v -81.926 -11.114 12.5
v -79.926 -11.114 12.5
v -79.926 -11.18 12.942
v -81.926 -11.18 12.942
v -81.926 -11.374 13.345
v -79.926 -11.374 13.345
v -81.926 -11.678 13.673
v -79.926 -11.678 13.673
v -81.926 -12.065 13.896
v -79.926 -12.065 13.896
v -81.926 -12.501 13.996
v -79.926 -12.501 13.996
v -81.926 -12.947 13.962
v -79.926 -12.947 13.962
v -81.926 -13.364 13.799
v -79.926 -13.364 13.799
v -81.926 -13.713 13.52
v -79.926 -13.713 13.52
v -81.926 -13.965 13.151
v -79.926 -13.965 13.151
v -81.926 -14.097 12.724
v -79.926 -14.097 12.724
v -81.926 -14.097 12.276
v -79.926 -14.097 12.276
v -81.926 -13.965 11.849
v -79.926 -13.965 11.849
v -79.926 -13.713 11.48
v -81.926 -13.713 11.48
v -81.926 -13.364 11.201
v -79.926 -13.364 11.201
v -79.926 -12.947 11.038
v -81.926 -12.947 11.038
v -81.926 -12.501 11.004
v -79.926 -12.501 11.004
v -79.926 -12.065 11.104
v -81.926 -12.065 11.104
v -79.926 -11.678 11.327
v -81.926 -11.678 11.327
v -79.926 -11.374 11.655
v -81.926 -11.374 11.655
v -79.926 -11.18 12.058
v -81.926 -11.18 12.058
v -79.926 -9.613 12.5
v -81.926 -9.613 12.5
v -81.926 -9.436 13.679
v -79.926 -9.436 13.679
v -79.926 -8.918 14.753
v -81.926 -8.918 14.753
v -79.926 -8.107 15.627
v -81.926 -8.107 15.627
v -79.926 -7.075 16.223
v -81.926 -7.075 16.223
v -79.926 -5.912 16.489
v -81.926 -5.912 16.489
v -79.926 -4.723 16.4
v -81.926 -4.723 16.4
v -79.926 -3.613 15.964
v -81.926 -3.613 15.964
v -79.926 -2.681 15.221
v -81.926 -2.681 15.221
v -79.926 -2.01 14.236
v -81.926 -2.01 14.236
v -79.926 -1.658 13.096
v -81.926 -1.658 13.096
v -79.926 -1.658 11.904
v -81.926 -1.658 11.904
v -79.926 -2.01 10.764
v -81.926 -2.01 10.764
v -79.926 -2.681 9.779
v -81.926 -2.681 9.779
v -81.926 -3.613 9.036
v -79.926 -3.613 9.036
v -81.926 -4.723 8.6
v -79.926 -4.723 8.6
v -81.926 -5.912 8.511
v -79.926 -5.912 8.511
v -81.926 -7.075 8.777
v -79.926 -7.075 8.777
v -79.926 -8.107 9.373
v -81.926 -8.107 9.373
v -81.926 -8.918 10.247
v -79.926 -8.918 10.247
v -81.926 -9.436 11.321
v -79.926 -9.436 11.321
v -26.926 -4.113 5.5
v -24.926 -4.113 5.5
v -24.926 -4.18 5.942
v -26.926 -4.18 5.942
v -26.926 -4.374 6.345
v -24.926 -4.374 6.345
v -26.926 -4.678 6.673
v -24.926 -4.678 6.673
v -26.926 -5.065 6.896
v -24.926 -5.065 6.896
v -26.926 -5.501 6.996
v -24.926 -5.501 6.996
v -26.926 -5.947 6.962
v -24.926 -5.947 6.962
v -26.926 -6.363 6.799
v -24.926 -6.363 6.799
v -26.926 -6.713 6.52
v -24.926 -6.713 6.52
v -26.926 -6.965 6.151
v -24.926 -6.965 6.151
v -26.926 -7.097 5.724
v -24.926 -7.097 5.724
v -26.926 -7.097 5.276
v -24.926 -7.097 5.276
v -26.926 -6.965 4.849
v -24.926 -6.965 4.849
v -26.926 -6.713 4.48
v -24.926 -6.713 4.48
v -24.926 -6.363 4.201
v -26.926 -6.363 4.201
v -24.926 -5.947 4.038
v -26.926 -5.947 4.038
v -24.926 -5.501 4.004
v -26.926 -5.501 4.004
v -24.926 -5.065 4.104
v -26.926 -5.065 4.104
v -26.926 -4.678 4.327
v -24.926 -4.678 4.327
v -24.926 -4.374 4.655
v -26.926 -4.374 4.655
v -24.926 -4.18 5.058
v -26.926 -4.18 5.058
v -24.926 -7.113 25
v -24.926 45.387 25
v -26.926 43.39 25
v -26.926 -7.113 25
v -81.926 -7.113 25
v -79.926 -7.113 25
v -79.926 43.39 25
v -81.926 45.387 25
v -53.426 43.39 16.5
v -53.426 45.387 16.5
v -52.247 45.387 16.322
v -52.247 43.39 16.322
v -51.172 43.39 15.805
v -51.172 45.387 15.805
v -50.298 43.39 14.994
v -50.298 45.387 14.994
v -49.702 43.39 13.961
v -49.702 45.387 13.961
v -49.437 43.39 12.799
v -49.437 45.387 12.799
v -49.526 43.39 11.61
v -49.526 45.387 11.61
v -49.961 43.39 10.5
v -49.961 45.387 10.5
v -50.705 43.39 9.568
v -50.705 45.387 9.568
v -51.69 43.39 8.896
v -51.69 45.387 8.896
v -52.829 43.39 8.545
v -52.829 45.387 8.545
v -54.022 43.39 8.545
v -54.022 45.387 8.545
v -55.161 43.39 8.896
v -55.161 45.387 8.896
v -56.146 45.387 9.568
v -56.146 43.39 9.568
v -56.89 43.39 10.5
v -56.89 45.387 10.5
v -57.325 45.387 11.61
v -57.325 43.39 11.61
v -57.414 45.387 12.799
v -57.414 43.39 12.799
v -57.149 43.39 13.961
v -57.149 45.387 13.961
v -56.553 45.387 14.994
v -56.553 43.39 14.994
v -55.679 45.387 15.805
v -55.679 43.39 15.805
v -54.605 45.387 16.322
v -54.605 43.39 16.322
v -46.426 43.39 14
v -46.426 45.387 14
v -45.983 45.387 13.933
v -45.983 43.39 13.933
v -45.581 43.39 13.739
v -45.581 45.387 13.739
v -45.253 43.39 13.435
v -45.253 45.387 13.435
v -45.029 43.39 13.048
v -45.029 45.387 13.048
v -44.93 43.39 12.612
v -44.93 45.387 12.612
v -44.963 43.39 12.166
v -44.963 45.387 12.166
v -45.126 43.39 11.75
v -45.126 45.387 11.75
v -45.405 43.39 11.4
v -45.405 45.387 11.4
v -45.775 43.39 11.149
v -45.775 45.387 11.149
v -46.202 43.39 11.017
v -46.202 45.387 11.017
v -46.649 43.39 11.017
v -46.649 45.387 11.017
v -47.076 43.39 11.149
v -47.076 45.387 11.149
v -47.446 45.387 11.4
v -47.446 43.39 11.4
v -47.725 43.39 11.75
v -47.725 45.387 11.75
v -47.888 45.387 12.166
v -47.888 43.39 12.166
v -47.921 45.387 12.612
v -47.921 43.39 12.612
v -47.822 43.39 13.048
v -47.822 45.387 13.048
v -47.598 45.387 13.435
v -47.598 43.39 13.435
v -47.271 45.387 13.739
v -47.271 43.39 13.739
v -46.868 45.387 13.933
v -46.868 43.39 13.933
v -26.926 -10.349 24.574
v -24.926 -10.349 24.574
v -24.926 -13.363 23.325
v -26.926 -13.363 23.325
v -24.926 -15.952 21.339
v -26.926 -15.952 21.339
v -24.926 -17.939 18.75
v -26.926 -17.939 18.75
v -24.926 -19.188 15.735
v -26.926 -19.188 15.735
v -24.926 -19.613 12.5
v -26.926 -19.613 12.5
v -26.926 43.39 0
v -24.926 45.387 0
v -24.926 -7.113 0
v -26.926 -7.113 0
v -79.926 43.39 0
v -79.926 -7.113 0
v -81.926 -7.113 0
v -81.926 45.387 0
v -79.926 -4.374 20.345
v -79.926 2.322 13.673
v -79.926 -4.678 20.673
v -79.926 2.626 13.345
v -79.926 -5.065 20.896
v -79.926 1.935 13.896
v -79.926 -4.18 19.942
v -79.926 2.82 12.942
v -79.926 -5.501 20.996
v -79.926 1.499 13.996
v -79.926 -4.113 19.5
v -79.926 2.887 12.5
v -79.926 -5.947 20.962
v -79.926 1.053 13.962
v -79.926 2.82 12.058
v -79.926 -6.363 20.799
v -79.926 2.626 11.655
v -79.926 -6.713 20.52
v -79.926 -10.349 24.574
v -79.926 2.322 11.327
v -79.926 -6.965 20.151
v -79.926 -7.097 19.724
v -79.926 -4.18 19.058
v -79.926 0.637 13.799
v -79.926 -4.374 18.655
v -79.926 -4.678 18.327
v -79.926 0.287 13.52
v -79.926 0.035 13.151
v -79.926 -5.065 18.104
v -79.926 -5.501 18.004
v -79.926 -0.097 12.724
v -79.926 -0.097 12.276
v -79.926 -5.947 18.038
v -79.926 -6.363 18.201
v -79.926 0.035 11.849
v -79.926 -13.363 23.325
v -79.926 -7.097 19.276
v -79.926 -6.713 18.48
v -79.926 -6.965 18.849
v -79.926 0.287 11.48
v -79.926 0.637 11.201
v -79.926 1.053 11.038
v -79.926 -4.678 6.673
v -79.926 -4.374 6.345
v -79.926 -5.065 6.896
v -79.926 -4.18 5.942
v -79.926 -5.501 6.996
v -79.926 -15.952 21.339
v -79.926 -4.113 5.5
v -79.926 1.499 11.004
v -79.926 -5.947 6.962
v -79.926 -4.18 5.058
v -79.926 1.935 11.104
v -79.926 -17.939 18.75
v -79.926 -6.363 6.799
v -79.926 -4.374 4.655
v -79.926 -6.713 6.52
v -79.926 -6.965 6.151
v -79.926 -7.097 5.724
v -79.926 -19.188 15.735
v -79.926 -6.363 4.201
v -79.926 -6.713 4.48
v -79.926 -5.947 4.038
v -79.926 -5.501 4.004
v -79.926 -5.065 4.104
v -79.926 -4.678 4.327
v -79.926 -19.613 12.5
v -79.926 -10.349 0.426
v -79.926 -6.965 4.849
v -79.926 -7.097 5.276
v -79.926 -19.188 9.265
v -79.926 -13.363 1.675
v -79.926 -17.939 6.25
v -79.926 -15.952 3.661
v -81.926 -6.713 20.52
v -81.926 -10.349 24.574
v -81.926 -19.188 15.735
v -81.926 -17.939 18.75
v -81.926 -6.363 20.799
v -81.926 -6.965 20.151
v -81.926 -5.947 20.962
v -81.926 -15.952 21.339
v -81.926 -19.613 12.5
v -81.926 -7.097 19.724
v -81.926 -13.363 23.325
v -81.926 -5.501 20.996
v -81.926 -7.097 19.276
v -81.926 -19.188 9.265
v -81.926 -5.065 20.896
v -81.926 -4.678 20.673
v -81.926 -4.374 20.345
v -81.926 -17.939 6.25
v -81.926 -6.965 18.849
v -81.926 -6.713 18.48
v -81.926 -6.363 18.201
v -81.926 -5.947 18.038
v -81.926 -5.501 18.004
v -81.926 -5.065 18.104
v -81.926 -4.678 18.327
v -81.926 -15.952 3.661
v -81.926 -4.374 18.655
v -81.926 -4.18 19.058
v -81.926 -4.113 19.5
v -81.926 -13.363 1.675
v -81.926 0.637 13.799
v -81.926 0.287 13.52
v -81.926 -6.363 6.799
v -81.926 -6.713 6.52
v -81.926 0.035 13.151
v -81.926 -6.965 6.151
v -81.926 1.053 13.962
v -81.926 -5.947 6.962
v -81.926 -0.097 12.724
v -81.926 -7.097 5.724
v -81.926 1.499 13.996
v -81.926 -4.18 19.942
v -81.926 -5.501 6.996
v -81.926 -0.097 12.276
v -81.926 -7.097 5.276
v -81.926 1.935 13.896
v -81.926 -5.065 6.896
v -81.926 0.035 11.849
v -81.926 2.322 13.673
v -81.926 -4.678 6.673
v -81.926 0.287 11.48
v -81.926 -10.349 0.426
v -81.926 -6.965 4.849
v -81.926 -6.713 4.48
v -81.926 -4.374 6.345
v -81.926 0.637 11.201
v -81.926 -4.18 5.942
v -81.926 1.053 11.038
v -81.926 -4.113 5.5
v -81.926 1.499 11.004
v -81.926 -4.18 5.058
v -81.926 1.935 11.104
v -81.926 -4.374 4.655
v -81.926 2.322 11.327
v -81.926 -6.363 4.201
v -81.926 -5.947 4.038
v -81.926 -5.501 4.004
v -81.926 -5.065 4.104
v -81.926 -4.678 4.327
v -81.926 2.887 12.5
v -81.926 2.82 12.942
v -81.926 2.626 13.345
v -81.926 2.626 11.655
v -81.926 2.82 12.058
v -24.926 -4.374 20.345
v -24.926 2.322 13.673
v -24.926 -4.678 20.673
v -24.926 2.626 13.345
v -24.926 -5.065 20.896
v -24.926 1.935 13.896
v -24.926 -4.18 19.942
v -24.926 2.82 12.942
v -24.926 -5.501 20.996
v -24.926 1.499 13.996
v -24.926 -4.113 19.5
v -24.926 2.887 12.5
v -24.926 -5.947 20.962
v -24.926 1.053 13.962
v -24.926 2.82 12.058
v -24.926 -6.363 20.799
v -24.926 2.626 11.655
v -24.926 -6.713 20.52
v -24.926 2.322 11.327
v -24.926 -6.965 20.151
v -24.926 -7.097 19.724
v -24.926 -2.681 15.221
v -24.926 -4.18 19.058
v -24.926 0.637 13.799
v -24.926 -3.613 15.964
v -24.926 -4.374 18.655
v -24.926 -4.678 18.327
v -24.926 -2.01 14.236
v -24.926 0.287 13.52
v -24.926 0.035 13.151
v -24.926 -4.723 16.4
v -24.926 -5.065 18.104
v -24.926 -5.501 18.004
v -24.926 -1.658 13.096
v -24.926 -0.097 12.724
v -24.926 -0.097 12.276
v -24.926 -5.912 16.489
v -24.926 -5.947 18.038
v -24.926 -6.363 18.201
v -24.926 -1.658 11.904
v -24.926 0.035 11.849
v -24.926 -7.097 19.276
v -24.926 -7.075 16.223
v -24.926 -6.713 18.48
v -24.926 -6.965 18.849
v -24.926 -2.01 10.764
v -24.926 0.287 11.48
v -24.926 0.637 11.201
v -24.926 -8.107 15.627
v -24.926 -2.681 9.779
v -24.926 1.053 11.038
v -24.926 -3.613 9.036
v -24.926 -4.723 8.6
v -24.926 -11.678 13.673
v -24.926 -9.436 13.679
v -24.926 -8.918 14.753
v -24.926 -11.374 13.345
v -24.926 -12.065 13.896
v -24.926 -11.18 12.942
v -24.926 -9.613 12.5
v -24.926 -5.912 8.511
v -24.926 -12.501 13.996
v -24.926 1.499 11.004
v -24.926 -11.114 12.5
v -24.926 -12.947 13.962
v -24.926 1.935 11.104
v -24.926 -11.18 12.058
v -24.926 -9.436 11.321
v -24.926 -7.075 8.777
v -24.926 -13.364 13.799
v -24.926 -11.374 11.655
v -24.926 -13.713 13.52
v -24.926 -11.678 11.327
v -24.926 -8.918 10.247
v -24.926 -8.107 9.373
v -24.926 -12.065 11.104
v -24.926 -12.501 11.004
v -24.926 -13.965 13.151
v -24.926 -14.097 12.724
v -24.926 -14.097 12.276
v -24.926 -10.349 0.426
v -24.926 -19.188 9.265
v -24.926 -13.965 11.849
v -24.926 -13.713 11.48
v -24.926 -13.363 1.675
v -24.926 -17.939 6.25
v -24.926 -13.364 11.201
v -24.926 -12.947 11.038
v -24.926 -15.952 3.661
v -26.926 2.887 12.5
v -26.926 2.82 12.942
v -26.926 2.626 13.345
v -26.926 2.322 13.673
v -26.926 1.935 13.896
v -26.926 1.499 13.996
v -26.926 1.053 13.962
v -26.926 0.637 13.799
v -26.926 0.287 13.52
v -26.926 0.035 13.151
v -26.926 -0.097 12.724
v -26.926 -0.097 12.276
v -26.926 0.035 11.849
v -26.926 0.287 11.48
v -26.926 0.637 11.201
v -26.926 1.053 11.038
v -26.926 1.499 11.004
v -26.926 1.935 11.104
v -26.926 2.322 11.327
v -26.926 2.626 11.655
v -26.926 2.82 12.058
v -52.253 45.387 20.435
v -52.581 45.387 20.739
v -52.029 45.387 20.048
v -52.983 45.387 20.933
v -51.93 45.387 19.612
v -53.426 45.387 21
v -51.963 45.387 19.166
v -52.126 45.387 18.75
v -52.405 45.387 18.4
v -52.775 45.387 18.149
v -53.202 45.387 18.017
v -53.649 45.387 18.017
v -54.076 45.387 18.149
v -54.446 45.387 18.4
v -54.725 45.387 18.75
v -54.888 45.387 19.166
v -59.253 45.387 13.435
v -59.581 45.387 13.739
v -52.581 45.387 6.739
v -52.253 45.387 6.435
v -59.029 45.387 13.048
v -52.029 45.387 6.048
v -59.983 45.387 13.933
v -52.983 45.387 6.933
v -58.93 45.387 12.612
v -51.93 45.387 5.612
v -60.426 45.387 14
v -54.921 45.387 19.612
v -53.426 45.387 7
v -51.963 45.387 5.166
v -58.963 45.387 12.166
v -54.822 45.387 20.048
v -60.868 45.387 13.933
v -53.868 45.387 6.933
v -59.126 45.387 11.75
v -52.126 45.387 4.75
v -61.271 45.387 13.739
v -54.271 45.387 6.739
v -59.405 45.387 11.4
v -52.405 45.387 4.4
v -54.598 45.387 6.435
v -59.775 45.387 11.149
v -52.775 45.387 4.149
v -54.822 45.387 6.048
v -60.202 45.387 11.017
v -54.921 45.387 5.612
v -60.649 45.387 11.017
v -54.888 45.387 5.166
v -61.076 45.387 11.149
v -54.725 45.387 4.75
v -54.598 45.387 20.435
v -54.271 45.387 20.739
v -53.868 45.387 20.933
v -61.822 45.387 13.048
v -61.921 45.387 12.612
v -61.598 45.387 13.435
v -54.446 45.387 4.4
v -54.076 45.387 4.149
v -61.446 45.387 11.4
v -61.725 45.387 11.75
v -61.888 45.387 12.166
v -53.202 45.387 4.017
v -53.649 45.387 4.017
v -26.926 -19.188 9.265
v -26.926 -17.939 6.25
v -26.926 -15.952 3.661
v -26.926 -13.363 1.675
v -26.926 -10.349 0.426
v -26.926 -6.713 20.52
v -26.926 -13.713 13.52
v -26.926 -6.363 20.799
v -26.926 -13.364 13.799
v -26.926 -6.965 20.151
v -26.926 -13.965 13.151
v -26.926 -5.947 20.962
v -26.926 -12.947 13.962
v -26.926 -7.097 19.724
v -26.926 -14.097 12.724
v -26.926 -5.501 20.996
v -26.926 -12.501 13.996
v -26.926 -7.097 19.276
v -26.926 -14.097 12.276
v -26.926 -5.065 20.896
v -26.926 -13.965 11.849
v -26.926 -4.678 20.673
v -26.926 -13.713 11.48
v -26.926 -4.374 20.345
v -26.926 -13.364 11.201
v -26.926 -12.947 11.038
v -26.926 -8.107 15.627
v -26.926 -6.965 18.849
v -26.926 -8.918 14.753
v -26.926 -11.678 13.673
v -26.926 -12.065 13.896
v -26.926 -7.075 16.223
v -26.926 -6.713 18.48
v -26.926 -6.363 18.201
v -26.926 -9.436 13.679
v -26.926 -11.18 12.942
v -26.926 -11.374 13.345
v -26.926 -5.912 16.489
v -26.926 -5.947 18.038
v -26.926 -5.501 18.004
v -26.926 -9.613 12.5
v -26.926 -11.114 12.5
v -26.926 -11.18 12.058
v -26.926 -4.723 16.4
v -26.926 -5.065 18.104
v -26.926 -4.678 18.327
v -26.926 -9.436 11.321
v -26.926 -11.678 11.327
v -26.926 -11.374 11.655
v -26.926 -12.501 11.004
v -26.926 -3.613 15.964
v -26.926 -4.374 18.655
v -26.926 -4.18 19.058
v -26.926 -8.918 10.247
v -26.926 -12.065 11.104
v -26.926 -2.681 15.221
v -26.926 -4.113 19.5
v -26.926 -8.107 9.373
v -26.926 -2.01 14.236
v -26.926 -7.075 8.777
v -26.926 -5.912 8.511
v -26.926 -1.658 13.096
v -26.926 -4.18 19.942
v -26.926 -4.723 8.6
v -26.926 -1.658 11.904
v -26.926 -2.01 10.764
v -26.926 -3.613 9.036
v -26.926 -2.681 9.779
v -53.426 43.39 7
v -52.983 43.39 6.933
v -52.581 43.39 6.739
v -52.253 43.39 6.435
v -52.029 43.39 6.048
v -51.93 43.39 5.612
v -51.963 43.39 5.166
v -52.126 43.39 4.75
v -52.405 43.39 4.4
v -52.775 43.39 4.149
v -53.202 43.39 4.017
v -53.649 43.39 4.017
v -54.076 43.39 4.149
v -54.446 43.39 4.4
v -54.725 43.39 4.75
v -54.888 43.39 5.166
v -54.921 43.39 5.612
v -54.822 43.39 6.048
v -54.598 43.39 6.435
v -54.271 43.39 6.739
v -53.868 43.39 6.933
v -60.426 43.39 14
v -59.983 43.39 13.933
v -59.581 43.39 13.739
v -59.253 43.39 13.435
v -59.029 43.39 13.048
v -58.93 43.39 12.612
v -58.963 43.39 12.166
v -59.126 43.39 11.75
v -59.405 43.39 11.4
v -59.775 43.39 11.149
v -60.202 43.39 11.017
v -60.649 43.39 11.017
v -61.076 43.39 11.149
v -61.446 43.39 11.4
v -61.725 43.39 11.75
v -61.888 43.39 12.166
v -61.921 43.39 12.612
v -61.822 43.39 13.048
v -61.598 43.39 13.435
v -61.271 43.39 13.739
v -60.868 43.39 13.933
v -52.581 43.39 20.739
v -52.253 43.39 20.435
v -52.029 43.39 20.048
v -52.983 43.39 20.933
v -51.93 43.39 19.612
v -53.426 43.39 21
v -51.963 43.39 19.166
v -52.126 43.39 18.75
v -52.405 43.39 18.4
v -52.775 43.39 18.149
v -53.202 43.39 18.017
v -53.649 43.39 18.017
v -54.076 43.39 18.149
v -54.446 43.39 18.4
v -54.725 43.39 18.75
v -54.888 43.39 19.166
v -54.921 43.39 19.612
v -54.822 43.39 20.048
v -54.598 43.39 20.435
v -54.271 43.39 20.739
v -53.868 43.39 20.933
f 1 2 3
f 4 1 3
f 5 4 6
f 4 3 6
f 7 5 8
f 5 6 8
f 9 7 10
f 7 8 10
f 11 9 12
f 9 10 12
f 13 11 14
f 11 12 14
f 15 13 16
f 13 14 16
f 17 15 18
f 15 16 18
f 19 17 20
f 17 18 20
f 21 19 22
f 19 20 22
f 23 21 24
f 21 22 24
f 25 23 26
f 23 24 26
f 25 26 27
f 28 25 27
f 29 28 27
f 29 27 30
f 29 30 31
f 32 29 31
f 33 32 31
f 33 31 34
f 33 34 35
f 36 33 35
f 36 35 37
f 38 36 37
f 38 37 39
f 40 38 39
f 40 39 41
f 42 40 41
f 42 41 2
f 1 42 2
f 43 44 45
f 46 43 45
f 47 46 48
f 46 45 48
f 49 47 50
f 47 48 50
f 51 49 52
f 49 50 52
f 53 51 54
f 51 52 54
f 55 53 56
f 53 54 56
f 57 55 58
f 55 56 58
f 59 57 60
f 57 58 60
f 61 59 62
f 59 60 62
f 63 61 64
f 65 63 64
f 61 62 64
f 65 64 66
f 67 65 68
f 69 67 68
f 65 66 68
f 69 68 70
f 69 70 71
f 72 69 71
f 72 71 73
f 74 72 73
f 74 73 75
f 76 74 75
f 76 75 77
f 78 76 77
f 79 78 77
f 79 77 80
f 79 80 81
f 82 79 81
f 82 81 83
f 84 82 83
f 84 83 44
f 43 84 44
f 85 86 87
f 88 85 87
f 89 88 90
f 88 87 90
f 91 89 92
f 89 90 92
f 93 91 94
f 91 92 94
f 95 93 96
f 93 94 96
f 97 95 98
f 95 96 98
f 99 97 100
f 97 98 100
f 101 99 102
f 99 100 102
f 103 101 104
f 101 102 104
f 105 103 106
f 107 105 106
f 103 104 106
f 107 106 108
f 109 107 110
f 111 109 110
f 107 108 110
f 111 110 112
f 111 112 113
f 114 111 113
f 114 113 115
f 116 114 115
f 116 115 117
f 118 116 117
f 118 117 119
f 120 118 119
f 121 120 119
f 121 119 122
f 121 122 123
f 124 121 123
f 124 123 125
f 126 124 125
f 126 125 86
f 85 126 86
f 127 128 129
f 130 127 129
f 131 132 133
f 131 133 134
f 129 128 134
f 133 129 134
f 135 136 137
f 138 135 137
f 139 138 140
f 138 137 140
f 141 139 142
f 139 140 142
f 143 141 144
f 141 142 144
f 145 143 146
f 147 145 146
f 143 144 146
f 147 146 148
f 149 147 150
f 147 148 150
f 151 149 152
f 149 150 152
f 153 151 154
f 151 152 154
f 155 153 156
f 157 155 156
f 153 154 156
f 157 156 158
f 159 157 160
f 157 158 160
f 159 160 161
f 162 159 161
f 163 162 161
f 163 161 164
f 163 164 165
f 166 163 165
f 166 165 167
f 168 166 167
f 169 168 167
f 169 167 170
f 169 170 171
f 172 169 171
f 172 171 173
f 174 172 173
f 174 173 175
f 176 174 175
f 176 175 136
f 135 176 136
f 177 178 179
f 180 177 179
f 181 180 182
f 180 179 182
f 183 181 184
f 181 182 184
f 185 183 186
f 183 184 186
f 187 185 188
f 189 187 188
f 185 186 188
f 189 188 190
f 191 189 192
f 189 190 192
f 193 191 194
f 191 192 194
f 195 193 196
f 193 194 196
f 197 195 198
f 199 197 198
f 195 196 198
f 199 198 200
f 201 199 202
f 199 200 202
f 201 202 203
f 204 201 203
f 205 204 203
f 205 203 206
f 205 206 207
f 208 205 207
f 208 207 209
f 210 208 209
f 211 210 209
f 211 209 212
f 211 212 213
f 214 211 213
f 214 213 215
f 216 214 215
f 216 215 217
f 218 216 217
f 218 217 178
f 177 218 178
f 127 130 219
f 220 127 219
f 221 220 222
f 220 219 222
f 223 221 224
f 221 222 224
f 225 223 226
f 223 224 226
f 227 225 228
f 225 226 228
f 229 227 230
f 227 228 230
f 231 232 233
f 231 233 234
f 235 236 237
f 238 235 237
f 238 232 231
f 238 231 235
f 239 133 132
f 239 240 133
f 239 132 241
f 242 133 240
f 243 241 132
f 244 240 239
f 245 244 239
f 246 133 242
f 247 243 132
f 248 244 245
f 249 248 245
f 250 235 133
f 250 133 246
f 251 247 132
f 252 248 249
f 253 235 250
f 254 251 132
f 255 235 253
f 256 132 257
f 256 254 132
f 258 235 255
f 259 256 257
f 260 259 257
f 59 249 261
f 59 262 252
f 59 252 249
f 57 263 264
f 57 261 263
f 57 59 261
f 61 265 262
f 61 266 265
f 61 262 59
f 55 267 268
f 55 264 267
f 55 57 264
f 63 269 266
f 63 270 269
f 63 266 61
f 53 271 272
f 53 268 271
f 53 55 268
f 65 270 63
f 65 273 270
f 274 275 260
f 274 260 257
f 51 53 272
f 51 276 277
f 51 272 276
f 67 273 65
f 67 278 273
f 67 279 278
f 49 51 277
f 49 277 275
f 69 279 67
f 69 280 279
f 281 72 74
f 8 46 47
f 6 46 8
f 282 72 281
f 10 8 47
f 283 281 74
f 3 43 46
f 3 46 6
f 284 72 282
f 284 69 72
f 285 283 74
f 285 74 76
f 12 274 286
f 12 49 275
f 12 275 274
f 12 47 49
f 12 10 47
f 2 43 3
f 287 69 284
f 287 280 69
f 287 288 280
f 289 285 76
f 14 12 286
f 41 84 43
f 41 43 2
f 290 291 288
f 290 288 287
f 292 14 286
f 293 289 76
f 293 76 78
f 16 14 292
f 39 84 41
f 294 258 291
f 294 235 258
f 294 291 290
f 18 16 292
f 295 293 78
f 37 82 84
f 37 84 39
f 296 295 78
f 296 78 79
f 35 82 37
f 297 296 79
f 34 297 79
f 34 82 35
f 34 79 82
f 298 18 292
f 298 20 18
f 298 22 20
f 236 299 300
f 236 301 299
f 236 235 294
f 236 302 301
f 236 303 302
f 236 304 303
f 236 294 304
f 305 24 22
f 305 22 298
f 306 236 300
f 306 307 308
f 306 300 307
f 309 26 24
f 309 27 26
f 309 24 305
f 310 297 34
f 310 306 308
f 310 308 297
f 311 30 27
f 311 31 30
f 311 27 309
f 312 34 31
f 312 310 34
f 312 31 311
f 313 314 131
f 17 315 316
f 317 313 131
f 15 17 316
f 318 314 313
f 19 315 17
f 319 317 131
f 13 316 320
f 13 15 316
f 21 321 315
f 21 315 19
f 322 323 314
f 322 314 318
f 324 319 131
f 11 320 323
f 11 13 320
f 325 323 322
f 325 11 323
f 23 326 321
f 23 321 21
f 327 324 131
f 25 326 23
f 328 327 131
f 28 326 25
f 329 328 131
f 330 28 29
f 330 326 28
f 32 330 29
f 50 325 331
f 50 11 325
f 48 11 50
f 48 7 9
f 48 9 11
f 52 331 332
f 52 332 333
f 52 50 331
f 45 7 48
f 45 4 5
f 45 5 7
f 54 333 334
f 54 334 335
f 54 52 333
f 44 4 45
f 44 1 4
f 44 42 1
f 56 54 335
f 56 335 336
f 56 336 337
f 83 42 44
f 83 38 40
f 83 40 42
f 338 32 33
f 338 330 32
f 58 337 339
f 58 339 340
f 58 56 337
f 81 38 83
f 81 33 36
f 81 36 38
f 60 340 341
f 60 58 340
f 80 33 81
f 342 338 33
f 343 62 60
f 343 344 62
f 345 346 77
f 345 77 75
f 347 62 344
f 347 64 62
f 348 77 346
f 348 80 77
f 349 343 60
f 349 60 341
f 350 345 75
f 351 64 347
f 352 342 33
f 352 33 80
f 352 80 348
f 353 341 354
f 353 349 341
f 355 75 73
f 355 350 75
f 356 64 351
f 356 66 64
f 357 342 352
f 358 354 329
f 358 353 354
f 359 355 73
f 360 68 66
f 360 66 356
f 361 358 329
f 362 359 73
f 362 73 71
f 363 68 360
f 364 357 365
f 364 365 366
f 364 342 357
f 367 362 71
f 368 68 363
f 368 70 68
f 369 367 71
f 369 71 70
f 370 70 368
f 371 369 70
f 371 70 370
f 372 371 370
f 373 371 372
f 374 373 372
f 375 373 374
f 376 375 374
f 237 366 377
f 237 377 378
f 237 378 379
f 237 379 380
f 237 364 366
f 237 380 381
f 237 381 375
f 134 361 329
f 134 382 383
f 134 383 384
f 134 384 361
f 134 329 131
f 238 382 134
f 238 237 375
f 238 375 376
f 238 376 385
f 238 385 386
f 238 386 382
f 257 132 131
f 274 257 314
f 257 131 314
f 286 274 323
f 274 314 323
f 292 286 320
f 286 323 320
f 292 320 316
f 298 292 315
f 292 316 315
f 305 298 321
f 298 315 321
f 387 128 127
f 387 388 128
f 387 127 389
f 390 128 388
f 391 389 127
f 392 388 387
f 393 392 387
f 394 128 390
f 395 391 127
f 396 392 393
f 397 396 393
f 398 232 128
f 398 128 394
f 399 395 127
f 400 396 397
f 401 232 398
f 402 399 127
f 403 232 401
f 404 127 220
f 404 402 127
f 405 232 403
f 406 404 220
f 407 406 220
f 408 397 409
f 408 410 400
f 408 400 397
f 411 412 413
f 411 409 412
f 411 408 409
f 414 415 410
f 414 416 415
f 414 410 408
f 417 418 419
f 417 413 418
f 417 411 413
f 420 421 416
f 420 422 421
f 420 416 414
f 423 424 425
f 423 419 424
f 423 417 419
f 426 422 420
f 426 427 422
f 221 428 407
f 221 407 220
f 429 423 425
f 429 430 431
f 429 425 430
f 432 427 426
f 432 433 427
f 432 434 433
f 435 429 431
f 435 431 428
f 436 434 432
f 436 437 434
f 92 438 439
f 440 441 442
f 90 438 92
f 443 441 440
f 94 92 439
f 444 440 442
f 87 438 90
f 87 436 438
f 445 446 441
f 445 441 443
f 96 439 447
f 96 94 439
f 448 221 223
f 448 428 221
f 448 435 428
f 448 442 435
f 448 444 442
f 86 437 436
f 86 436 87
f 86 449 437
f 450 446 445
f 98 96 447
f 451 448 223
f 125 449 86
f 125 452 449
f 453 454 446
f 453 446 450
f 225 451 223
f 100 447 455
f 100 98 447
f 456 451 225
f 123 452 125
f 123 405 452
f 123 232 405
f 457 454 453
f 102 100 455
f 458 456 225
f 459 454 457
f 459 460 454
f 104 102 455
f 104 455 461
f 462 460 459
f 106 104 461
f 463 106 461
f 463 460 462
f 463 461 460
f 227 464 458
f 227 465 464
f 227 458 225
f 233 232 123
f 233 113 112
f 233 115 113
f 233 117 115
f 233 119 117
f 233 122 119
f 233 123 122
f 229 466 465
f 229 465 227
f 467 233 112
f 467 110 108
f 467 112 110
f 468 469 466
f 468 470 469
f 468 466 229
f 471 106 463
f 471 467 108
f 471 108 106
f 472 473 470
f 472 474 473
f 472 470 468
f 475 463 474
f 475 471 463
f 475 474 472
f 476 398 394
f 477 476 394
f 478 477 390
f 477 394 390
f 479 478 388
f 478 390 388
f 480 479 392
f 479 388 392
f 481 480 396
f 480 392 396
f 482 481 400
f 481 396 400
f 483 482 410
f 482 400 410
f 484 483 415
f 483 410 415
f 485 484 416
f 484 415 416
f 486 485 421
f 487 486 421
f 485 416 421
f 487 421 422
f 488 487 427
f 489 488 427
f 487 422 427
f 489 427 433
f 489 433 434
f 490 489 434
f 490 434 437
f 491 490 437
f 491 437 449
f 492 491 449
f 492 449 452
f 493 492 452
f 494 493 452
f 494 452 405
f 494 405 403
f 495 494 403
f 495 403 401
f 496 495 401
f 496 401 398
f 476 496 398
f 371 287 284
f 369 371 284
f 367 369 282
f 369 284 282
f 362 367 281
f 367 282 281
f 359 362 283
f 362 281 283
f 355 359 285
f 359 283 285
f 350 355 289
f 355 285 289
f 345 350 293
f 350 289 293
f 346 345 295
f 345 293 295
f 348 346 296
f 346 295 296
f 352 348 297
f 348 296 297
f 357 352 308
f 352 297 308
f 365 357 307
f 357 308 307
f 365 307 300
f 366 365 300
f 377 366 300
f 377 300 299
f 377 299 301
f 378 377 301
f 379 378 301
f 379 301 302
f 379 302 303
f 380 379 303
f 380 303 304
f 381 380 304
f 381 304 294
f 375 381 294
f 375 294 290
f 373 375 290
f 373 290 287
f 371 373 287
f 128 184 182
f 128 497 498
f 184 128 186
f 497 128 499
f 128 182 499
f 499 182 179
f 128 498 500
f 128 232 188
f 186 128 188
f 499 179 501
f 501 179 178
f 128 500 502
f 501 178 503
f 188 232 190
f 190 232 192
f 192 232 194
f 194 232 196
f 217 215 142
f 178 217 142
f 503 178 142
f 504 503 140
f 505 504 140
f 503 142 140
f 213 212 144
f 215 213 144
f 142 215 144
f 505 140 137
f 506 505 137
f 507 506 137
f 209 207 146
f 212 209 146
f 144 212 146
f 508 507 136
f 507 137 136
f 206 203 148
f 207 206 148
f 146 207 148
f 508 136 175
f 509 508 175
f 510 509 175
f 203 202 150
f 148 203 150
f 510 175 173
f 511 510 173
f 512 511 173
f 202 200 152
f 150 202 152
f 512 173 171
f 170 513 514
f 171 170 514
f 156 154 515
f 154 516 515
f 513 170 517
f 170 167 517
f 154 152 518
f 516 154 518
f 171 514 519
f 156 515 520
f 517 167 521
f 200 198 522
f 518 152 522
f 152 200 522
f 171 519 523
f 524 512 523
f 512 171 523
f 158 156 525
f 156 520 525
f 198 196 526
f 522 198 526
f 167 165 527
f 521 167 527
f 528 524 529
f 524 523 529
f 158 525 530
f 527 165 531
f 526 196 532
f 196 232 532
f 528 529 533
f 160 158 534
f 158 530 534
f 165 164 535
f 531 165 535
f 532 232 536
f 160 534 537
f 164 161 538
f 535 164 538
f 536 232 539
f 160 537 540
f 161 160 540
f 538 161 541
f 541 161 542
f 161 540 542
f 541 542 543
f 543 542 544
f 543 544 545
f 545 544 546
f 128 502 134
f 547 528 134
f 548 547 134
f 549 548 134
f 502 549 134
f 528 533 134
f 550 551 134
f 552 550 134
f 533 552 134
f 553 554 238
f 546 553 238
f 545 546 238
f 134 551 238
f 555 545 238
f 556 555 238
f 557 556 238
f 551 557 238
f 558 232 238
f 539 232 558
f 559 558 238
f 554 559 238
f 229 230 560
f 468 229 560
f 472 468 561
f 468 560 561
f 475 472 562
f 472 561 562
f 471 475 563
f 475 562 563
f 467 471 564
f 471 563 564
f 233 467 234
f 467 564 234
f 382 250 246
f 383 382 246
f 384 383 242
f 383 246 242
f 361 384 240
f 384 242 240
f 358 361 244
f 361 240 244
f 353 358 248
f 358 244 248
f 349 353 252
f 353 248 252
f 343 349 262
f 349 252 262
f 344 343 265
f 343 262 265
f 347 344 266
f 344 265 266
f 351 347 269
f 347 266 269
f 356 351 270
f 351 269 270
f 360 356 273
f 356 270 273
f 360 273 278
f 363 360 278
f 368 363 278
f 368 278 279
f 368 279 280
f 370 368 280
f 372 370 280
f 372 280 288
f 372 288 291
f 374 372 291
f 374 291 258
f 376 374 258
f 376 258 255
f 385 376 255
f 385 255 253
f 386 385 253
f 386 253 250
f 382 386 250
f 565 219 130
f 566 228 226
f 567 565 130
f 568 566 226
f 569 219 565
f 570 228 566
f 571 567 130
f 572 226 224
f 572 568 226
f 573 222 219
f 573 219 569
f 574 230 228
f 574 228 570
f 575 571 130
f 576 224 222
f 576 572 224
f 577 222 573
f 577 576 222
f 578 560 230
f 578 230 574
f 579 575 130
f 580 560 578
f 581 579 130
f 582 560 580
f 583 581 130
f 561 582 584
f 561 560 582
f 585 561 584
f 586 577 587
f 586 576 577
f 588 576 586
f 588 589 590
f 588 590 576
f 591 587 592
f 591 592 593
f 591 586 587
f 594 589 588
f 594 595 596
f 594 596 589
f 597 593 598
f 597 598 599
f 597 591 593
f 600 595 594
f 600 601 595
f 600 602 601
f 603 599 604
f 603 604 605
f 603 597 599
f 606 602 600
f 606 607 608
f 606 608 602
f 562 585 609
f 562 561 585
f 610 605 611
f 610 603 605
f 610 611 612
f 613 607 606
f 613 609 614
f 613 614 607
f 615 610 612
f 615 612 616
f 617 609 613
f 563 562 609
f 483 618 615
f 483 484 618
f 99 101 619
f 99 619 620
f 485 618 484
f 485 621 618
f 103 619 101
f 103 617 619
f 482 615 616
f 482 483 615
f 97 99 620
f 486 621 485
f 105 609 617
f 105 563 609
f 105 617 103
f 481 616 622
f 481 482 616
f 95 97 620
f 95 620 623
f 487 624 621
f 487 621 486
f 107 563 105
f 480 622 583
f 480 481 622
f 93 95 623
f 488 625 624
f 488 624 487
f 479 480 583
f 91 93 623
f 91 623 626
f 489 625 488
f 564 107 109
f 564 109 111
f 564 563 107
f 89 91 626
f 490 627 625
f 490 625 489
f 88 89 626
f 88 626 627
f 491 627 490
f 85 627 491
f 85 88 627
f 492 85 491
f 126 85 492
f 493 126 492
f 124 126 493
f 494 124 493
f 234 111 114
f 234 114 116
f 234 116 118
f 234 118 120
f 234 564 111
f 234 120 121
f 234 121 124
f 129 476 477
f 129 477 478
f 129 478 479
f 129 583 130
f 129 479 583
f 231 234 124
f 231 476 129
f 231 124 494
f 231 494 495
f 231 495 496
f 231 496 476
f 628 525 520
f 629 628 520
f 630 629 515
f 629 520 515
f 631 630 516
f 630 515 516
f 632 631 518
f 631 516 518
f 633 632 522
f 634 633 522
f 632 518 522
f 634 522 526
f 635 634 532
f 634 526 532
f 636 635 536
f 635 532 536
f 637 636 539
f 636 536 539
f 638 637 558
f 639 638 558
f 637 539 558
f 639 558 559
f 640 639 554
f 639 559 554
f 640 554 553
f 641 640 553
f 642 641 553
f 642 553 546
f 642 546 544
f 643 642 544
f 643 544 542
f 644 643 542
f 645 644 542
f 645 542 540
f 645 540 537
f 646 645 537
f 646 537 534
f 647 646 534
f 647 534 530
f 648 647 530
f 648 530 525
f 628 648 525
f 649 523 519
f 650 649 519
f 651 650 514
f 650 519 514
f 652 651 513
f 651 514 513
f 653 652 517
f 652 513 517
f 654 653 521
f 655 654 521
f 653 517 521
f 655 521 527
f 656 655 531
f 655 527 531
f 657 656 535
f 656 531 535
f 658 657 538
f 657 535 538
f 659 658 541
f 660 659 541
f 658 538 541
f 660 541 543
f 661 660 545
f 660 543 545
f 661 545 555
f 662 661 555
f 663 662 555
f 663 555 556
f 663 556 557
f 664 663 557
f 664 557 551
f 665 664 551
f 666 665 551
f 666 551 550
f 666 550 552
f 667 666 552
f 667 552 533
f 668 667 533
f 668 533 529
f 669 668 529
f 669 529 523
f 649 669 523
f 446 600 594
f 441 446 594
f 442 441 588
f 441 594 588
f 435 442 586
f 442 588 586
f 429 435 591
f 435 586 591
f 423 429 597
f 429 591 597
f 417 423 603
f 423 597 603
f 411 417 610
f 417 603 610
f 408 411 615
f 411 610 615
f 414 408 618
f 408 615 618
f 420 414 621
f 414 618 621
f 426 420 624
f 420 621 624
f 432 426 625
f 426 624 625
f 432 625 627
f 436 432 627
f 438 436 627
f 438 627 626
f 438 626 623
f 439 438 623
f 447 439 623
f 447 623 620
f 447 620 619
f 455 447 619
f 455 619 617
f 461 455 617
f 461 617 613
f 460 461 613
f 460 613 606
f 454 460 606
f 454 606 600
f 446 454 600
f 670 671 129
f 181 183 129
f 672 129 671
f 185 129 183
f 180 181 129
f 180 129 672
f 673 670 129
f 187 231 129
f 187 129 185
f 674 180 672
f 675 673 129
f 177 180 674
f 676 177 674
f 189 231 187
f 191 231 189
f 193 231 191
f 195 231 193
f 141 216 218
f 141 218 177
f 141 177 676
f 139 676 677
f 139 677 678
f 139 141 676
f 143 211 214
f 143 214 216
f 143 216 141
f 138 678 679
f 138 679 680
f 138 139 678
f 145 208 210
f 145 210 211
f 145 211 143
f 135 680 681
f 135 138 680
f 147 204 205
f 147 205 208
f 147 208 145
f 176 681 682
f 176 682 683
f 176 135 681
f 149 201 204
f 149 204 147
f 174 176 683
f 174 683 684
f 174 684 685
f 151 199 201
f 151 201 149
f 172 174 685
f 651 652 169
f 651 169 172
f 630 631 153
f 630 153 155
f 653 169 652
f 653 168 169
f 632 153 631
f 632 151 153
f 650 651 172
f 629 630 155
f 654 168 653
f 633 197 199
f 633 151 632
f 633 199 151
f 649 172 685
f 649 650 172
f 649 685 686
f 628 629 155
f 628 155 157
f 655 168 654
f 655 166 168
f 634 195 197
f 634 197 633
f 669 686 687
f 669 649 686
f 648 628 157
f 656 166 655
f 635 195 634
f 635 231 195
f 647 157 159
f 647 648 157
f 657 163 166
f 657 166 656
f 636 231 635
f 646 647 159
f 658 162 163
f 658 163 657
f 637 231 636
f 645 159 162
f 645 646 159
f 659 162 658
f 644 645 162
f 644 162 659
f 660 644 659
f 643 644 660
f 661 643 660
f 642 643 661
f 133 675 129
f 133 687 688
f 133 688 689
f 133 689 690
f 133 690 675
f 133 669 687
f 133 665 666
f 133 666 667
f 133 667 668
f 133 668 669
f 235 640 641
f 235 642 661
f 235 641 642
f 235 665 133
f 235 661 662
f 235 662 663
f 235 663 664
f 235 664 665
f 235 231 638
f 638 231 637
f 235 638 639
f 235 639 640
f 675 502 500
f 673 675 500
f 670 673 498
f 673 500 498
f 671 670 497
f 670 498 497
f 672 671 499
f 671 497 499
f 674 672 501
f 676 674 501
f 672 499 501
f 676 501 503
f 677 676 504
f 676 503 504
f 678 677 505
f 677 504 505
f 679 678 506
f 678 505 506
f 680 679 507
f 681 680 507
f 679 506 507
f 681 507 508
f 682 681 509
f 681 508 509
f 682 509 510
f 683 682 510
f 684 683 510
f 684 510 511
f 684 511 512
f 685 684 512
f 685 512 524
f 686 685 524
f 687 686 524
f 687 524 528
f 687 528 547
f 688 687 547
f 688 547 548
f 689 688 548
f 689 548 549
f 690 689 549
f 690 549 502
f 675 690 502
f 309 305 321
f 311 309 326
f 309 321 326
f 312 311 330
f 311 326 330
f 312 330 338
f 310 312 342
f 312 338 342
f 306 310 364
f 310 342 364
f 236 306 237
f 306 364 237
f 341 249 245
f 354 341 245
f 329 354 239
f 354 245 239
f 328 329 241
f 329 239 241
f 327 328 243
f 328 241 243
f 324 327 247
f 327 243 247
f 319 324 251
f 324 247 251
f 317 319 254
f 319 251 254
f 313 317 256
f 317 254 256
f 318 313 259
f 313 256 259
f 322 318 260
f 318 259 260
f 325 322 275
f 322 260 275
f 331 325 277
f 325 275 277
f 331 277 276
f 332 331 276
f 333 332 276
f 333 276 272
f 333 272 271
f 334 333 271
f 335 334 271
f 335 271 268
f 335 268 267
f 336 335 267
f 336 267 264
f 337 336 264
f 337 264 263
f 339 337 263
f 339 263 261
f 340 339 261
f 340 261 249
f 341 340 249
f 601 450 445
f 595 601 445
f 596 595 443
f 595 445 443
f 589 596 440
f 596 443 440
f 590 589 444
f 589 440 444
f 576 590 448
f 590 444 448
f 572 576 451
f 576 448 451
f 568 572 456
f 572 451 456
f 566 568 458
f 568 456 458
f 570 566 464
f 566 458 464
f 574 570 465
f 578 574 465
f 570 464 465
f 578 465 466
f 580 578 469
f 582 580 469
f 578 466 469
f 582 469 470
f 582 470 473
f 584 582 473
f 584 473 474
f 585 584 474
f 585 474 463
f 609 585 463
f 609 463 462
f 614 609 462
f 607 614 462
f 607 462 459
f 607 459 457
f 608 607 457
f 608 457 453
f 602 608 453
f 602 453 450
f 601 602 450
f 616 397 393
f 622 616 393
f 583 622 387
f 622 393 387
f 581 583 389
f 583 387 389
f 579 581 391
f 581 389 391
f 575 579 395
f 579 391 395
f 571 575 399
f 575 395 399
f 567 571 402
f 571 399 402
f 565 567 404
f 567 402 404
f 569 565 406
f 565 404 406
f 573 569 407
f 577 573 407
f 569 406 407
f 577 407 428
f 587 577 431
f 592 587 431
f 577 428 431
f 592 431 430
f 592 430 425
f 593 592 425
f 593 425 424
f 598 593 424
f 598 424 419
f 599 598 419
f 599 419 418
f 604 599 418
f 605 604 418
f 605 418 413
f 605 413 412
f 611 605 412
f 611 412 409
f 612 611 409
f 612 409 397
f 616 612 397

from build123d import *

# Parameters (mm, degrees)
BOSS_EXTRUDE2_DEPTH = 25
SKETCH4_R           = 4
CUT_EXTRUDE1_DEPTH  = 108.5257706
SKETCH6_R           = 4
CUT_EXTRUDE2_DEPTH  = 78.032036302
CUT_EXTRUDE3_DEPTH  = 78.032036302
SKETCH9_R           = 1.5
CUT_EXTRUDE4_DEPTH  = 78.032036302
SKETCH10_R          = 1.5
CUT_EXTRUDE5_DEPTH  = 108.5257706


with BuildPart() as part:
    # Sketch3 → Boss-Extrude2 (new body)
    with BuildSketch(Plane.XY):
        Polygon((-79.925523148, 45.386502584), (-27.042967192, 45.386502584), (-24.925523148, 45.386502584), (-24.925523148, -19.613497416), (-26.925523148, -19.613497416), (-26.925523148, 43.389953837), (-79.925523148, 43.389953837), (-79.925523148, -19.613497416), (-81.925523148, -19.613497416), (-81.925523148, 45.386502584), align=None)
    extrude(amount=BOSS_EXTRUDE2_DEPTH)

    # Sketch4 → Cut-Extrude1 (cut, through all)
    with BuildSketch(Plane(origin=(0, 45.386502584, 0), x_dir=(1, 0, 0), z_dir=(0, 1, 0))):
        with Locations(Location((-53.425523148, -12.5, 0), (0, 0, 270))):
            Circle(SKETCH4_R)
    extrude(amount=-CUT_EXTRUDE1_DEPTH, mode=Mode.SUBTRACT)

    # Sketch6 → Cut-Extrude2 (cut, through all)
    with BuildSketch(Plane.ZY.offset(81.925523148)):
        with Locations(Location((12.5, -5.613497416, 0), (0, 0, 270))):
            Circle(SKETCH6_R)
    extrude(amount=-CUT_EXTRUDE2_DEPTH, mode=Mode.SUBTRACT)

    # Sketch8 → Cut-Extrude3 (cut, through all)
    with BuildSketch(Plane.ZY.offset(81.925523148)):
        with BuildLine():
            Line((0, -19.613497416), (12.5, -19.613497416))
            ThreePointArc((12.5, -19.613497416), (3.661165213, -15.952332159), (0, -7.113497352))
            Line((0, -7.113497352), (0, -19.613497416))
        make_face()
        with BuildLine():
            Line((12.5, -19.613497416), (25, -19.613497416))
            Line((25, -19.613497416), (25, -7.113497416))
            ThreePointArc((25, -7.113497416), (21.338834765, -15.952332181), (12.5, -19.613497416))
        make_face()
    extrude(amount=-CUT_EXTRUDE3_DEPTH, mode=Mode.SUBTRACT)

    # Sketch9 → Cut-Extrude4 (cut, through all)
    with BuildSketch(Plane(origin=(-24.925523148, 0, 0), x_dir=(0, 0, -1), z_dir=(1, 0, 0))):
        with Locations(Location((-12.500004148, -12.613501564, 0), (0, 0, 90))):
            Circle(SKETCH9_R)
        with Locations(Location((-19.500008296, -5.613497416, 0), (0, 0, 90))):
            Circle(SKETCH9_R)
        with Locations(Location((-5.5, -5.613497416, 0), (0, 0, 90))):
            Circle(SKETCH9_R)
        with Locations(Location((-12.500004148, 1.386506731, 0), (0, 0, 90))):
            Circle(SKETCH9_R)
    extrude(amount=-CUT_EXTRUDE4_DEPTH, mode=Mode.SUBTRACT)

    # Sketch10 → Cut-Extrude5 (cut, through all)
    with BuildSketch(Plane(origin=(0, 45.386502584, 0), x_dir=(1, 0, 0), z_dir=(0, 1, 0))):
        with Locations(Location((-46.425523148, -12.499998866, 0), (0, 0, 270))):
            Circle(SKETCH10_R)
        with Locations(Location((-53.425523148, -5.499998866, 0), (0, 0, 270))):
            Circle(SKETCH10_R)
        with Locations(Location((-53.425523148, -19.499998866, 0), (0, 0, 270))):
            Circle(SKETCH10_R)
        with Locations(Location((-60.425523148, -12.499998866, 0), (0, 0, 270))):
            Circle(SKETCH10_R)
    extrude(amount=-CUT_EXTRUDE5_DEPTH, mode=Mode.SUBTRACT)


solid = part.part
